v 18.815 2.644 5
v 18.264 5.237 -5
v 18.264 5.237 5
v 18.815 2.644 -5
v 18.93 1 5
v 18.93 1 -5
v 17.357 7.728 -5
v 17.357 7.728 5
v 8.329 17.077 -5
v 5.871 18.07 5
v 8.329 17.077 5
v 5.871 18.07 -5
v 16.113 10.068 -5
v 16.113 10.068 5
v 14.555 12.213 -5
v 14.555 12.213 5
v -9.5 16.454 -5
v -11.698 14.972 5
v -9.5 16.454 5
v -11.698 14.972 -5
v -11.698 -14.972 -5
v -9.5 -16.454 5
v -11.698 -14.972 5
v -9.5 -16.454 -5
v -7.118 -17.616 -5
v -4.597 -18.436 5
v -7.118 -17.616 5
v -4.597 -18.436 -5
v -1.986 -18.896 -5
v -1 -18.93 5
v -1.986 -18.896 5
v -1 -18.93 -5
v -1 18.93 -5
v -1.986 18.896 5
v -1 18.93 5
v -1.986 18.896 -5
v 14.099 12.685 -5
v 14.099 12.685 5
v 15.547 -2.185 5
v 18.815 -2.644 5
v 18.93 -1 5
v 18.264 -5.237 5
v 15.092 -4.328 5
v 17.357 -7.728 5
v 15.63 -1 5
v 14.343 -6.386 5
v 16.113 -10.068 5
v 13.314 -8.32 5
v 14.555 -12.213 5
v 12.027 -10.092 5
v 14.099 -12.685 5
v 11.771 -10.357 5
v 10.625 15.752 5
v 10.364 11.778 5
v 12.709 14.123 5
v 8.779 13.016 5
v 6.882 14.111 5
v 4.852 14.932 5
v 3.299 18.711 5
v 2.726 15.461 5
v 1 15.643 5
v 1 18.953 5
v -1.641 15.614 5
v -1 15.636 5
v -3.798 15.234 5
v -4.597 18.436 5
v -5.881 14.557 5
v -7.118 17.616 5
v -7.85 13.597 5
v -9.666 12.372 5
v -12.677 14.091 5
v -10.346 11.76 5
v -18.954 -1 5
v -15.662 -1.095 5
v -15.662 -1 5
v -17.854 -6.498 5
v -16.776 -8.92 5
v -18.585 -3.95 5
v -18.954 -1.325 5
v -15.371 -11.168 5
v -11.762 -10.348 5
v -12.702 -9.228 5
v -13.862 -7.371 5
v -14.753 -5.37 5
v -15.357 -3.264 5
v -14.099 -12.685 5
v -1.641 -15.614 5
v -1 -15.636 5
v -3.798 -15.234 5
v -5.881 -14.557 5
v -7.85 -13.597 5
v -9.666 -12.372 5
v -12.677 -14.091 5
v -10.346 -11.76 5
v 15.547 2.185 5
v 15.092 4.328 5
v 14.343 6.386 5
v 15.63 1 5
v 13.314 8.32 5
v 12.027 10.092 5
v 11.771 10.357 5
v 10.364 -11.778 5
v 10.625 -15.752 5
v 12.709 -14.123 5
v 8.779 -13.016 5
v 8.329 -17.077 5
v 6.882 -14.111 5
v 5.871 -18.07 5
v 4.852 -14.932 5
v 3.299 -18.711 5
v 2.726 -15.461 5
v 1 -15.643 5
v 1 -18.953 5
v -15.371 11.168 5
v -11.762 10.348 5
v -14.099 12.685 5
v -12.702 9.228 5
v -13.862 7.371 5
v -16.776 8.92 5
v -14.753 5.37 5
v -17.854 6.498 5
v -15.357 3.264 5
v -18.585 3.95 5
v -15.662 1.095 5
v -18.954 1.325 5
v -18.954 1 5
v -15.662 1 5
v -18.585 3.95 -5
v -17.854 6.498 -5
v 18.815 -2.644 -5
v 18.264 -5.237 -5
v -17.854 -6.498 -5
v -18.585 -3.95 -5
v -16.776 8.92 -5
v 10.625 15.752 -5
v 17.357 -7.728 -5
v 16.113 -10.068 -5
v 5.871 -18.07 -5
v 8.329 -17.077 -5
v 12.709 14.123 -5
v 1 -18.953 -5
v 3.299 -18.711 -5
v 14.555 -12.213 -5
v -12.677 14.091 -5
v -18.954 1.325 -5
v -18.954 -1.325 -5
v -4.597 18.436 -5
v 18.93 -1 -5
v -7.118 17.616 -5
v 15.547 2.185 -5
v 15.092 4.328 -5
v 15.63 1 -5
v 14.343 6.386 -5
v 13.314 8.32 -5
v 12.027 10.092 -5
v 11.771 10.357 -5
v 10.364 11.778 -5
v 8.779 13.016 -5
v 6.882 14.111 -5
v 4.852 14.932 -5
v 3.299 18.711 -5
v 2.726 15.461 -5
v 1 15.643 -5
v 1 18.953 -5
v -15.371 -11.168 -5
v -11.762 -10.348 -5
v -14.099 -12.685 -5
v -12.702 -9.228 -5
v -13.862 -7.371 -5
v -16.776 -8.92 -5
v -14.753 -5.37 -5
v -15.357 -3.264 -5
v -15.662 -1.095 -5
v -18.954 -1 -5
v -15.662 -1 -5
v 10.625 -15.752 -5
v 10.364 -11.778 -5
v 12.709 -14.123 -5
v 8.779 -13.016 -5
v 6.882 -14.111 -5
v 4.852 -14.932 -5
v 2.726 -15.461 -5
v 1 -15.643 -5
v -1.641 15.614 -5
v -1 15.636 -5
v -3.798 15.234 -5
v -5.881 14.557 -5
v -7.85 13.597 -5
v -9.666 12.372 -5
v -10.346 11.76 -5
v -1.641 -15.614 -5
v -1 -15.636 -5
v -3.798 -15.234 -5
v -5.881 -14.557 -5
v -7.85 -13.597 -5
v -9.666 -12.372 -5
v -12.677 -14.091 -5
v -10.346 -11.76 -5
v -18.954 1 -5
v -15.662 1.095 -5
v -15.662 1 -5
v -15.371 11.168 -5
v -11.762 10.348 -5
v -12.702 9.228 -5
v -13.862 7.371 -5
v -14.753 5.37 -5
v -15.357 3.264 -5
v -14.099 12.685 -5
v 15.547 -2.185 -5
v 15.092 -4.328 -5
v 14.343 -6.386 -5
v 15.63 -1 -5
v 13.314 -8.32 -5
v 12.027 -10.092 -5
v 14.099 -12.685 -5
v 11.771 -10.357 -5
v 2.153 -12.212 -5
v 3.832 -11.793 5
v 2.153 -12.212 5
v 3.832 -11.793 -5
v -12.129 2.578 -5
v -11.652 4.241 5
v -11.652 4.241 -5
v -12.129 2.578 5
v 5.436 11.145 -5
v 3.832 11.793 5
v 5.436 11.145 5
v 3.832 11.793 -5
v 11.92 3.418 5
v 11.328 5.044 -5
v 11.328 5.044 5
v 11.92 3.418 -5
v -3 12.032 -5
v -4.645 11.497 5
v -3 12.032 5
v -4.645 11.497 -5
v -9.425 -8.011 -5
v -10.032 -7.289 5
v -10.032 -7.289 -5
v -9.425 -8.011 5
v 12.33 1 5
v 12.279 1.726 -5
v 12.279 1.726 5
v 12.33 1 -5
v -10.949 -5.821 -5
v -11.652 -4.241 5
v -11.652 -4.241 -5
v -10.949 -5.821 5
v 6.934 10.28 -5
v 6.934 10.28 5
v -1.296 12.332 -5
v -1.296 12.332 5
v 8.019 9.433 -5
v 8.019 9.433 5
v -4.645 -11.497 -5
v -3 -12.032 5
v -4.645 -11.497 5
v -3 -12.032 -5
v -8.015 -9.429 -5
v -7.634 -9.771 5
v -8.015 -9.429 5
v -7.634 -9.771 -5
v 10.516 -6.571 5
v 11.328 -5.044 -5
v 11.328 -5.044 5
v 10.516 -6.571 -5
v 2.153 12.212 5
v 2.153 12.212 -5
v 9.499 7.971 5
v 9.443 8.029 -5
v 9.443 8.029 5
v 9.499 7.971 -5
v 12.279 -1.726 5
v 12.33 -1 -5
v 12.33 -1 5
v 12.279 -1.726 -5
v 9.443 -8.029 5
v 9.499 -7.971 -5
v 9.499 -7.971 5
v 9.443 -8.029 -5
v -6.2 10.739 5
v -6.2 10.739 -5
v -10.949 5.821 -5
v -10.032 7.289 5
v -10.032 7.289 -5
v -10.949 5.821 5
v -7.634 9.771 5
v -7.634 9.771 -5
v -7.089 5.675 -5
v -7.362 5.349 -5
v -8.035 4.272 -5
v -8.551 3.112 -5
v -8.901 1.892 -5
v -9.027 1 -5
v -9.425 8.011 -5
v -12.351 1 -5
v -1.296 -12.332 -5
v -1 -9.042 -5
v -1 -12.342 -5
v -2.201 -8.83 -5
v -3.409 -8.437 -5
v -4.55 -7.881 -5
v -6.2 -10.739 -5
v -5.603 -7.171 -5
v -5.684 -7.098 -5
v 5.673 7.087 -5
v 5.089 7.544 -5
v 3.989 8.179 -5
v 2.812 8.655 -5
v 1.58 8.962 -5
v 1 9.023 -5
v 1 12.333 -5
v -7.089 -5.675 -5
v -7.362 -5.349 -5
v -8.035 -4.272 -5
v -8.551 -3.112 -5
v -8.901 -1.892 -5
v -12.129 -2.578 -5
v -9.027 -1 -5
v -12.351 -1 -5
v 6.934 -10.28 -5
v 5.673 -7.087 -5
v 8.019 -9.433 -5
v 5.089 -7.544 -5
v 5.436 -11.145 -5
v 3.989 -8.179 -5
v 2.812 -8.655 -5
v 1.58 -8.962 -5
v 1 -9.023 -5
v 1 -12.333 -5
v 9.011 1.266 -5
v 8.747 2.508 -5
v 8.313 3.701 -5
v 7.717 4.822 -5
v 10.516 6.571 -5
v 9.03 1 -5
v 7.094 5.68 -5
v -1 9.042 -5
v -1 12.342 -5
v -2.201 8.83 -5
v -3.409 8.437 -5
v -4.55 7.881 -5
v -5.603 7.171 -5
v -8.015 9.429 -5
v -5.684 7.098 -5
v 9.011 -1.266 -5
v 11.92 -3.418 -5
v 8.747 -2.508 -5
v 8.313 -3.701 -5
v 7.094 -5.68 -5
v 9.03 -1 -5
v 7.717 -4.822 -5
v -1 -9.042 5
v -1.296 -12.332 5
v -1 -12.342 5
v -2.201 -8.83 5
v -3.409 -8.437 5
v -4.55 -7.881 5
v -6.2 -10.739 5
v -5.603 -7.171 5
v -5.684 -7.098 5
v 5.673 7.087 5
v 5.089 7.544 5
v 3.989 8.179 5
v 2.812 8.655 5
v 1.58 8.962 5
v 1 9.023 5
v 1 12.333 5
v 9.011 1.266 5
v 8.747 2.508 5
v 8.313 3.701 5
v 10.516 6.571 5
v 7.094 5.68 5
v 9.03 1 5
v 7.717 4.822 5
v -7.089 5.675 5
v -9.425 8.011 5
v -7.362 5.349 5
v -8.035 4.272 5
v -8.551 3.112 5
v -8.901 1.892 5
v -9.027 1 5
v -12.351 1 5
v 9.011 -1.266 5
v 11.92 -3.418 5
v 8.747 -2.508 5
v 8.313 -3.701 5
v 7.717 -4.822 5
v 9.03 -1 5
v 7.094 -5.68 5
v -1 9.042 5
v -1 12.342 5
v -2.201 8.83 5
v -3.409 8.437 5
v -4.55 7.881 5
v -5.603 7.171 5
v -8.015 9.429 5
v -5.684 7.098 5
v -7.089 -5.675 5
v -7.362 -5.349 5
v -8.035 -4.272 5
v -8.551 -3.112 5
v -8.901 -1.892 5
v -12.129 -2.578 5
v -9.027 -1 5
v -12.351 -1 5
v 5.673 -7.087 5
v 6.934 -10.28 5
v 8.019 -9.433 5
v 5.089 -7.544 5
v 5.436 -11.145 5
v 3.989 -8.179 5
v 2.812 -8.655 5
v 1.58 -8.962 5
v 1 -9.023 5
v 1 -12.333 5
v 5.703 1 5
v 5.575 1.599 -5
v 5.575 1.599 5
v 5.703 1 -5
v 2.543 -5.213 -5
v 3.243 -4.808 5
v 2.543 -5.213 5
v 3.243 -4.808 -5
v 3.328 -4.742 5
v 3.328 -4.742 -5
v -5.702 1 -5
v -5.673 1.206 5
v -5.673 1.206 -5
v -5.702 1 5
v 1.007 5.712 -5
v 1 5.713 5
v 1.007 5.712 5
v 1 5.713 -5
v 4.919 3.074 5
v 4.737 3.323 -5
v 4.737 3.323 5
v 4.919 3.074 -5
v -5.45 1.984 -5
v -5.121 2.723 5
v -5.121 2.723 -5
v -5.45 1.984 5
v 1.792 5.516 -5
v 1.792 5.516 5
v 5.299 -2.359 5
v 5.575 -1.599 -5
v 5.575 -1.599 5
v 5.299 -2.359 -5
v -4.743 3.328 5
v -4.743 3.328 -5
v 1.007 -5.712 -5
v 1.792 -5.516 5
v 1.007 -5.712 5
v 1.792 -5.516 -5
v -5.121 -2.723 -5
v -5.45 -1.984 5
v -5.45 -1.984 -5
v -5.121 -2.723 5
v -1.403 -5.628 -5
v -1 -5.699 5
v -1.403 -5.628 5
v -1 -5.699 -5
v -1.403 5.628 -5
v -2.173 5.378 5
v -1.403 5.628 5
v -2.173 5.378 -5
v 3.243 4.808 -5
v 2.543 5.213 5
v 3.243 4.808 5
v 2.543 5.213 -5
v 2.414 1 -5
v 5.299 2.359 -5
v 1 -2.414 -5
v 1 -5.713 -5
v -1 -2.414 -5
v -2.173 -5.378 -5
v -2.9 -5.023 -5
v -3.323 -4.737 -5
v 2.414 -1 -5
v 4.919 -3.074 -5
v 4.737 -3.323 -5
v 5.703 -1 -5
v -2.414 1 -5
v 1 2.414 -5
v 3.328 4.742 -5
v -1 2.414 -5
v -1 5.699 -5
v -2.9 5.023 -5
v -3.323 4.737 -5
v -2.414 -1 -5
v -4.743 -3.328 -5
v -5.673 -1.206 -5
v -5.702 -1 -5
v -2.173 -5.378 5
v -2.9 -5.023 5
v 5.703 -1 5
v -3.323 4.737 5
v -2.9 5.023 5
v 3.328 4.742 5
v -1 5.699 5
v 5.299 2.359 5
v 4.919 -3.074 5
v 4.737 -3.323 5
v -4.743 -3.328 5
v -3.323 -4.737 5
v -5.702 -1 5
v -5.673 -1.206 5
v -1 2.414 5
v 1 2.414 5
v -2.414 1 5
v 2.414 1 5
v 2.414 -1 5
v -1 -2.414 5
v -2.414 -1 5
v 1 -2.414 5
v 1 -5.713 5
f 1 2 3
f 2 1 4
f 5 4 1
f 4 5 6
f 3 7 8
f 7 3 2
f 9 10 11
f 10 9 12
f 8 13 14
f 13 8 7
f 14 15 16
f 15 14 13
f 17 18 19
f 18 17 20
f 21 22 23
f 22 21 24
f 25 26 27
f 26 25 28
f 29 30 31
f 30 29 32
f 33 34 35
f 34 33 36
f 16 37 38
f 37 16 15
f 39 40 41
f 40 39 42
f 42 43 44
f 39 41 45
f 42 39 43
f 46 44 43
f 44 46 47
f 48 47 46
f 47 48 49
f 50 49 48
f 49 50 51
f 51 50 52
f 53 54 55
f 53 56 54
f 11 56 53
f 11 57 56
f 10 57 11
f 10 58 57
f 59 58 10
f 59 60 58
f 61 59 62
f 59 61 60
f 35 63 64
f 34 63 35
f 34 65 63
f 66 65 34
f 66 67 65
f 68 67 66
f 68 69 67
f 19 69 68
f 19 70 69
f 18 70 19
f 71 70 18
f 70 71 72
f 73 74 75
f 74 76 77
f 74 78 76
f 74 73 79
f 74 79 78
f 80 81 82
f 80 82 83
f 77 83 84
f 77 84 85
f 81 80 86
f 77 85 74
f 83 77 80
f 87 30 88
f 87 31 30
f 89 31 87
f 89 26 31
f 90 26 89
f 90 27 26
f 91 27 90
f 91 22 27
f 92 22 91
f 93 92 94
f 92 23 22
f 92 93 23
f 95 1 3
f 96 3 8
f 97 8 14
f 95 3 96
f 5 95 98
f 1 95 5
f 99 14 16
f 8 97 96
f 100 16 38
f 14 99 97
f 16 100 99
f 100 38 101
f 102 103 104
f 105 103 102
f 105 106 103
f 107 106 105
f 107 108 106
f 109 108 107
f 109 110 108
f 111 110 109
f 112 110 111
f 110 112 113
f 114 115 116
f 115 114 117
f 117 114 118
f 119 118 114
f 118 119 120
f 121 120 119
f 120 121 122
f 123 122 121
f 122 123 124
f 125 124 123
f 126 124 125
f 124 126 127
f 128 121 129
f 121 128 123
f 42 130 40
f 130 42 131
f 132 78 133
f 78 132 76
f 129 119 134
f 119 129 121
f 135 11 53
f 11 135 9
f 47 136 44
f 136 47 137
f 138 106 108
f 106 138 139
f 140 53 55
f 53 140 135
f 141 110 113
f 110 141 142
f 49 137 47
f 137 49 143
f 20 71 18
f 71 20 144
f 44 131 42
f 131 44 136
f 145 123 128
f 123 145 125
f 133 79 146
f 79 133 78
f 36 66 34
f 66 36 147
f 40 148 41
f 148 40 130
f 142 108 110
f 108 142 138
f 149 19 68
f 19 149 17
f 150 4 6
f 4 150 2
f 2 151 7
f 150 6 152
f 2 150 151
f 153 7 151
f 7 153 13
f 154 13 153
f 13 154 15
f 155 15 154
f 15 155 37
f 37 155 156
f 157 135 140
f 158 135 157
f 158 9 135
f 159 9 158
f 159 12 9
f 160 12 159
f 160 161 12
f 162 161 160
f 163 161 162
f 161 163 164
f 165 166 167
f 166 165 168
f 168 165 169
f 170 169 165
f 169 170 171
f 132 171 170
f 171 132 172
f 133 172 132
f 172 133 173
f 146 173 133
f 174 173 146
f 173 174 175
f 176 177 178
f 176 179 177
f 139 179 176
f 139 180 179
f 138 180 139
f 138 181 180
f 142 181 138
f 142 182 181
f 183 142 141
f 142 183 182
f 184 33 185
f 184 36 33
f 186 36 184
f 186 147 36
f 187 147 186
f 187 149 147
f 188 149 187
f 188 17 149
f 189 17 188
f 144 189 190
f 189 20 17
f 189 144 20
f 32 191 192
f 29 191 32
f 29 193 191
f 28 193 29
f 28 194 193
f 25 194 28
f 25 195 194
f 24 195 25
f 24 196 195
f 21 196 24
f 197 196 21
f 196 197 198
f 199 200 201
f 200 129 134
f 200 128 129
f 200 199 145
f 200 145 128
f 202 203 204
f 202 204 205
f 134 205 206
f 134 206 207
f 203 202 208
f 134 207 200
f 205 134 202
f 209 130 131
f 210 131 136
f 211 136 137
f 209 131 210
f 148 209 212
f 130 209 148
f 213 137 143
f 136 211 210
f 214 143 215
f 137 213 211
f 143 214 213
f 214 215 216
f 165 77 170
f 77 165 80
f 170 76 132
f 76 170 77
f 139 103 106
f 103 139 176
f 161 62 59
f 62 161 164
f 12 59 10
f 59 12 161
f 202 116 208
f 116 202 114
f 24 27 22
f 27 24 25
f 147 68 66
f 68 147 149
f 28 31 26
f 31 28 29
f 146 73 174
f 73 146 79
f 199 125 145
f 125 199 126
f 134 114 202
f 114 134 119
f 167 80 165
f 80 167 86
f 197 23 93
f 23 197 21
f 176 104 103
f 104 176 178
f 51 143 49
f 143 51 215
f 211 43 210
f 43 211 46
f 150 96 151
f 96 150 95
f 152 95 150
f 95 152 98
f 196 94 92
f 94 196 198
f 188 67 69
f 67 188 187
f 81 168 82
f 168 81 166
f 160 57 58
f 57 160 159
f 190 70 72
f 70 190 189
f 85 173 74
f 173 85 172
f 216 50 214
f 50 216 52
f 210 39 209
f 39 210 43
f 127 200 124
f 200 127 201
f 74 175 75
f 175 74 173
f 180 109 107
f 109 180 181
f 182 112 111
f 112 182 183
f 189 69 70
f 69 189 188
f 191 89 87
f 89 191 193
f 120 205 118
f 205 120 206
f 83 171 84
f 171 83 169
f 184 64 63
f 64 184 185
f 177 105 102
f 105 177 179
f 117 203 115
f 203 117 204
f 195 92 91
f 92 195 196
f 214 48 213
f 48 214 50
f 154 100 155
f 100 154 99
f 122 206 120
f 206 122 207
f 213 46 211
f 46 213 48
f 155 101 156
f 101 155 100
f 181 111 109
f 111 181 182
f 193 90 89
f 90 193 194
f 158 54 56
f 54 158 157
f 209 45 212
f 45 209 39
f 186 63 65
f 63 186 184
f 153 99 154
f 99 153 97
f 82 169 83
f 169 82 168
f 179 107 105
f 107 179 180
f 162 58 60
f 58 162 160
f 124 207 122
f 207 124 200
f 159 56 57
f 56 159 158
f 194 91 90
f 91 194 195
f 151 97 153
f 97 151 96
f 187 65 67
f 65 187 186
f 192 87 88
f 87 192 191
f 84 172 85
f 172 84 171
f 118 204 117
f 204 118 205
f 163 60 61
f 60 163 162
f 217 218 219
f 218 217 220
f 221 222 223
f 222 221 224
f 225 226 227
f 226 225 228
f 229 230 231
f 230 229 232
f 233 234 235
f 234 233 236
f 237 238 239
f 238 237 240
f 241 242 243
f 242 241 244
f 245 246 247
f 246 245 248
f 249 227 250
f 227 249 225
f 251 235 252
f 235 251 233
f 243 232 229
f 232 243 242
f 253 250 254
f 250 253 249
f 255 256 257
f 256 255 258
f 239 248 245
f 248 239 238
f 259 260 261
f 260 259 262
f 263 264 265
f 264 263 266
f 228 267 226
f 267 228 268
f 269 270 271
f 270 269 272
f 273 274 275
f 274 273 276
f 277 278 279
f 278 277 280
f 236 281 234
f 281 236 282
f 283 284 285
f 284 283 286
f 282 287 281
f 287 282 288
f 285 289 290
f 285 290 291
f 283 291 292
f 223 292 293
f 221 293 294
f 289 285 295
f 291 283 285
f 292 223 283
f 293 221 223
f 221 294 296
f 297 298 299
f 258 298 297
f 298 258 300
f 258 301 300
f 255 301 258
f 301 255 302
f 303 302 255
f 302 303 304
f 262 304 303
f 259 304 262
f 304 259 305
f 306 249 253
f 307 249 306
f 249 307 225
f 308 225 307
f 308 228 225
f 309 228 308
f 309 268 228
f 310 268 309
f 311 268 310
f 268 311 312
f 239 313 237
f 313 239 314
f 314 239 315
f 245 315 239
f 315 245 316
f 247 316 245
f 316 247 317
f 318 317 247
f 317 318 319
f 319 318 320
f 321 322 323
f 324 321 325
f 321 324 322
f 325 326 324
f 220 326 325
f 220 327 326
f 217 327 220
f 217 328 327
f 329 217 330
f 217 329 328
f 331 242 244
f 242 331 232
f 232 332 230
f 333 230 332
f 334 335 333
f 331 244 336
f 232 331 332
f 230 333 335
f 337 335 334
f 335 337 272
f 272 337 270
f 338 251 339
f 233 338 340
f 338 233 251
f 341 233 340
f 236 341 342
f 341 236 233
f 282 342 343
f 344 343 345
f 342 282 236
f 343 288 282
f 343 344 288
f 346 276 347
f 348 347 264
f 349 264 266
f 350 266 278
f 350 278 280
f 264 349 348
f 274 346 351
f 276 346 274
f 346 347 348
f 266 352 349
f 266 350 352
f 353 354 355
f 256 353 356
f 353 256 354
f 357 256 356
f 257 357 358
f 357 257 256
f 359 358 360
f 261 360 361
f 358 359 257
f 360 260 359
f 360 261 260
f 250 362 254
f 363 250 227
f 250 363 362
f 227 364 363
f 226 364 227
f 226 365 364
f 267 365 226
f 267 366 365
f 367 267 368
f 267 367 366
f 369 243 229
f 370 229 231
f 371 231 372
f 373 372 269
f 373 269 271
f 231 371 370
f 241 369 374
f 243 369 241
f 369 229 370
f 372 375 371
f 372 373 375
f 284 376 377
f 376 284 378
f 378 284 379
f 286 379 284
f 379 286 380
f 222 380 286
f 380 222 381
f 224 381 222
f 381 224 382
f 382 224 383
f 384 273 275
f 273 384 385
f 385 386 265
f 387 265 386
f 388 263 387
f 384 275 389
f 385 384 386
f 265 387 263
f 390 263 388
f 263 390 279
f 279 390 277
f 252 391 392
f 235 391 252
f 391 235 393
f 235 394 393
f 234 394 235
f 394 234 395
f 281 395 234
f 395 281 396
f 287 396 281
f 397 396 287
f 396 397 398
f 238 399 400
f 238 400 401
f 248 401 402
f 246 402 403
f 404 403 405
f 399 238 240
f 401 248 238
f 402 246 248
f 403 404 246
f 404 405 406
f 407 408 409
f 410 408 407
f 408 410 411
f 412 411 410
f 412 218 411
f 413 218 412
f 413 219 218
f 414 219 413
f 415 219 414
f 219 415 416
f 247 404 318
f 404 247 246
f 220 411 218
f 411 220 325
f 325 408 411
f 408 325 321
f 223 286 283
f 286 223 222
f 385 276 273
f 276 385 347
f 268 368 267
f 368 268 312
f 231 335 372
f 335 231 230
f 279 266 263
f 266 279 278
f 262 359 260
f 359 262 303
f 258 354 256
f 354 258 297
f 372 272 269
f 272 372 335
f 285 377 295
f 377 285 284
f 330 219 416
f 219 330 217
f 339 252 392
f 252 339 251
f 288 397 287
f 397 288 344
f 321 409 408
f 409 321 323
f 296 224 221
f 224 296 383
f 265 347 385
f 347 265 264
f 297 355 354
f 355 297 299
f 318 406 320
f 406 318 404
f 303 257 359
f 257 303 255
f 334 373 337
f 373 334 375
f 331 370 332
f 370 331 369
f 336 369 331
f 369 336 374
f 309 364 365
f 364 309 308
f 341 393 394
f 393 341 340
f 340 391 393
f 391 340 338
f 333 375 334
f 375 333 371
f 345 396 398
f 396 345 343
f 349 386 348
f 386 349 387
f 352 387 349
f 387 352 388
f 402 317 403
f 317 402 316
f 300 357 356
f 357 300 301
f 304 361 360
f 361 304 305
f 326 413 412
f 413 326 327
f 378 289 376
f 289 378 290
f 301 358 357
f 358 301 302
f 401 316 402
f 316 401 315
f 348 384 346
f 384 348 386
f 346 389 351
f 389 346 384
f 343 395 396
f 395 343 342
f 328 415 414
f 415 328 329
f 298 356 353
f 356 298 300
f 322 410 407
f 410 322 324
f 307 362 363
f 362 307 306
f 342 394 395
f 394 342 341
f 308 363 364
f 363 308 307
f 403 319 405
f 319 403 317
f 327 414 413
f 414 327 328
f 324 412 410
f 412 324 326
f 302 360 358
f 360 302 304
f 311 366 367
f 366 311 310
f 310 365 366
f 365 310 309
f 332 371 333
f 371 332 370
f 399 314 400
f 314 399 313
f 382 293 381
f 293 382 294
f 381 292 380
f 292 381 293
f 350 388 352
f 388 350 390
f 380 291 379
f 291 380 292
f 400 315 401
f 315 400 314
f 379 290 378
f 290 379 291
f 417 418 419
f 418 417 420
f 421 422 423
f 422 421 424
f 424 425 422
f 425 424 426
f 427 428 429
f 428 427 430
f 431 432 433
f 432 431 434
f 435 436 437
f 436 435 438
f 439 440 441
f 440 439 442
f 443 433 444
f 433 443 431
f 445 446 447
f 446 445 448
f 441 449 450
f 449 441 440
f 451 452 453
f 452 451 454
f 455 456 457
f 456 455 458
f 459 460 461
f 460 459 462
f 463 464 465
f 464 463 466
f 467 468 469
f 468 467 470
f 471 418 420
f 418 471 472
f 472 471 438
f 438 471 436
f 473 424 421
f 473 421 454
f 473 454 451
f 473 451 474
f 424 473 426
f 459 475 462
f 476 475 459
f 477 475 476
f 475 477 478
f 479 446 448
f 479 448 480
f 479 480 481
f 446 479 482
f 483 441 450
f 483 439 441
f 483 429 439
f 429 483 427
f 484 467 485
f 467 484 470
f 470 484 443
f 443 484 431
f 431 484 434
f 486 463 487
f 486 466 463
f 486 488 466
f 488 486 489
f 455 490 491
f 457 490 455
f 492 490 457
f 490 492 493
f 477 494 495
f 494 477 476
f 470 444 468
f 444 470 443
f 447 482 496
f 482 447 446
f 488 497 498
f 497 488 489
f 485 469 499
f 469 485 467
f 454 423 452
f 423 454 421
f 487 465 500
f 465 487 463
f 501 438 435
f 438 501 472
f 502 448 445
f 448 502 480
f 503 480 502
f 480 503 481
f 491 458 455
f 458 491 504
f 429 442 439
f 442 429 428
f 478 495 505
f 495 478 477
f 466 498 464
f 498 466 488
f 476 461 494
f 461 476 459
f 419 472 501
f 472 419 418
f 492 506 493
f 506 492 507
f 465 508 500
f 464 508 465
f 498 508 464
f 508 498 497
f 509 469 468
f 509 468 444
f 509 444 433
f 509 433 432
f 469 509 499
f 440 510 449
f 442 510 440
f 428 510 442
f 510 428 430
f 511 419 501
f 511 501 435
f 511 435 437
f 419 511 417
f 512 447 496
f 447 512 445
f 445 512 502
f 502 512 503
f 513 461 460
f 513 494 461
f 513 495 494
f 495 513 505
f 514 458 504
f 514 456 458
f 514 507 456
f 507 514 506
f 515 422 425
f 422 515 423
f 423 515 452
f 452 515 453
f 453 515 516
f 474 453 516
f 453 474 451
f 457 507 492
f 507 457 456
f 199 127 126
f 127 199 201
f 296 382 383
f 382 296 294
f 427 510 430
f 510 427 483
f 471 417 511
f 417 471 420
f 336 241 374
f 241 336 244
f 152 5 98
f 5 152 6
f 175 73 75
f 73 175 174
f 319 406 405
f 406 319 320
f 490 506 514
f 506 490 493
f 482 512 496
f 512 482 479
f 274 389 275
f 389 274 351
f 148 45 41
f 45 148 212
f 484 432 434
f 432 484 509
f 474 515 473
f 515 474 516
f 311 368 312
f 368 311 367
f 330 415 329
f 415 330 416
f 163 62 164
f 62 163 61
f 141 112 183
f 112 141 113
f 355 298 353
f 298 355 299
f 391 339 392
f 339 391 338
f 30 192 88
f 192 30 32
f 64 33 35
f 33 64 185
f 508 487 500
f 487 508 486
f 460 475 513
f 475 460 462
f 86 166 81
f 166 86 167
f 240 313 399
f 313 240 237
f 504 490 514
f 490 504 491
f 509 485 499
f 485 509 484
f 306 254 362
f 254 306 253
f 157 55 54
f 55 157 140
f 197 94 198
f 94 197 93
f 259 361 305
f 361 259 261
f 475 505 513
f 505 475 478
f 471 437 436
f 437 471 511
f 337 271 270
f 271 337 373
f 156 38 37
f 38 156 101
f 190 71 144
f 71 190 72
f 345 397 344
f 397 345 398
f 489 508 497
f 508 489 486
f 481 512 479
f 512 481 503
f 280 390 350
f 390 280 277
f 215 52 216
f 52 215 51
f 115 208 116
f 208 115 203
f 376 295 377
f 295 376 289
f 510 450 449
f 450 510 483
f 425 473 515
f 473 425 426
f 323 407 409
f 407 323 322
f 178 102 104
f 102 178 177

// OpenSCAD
/* [FAN FEATURES] */

// How large is the fan rotor ? (mm)
OuterDiameter=38; 
// How large is the inner part of the fan rotator ? (mm)
InnerDiameter=5; 

/* [RINGS] */

// How many concentric rings should be generated ?
NumberOfRings = 3; // [1:20]
// The height of the extruded rings (mm)
Height = 10; 
// The number of faces on each ring perimeter
Resoultion=45; // [3:100]


/* [CONNECTORS] */

// With of the solid connectors that keeps the rings attached to the surface (mm)
ConnectorsWidth=2;  
// Generate a pair of solid orthogonal connectors ?
AddOrtogonalConnectors="YES"; // [YES,NO]
// Generate a pair of solid diagonal connectors ?
AddDiagonalConnectors="YES"; // [YES,NO]


// VARIABLES INITIALIZATION
echo("OuterDiameter=",OuterDiameter);
echo("InnerDiameter=",InnerDiameter);
echo("NumberOfRings=",NumberOfRings);
echo("Height=",Height);
echo("Resoultion=",Resoultion);

OuterRadius = OuterDiameter/2;
echo("OuterRadius=",OuterRadius);
InnerRadius = InnerDiameter/2;
echo("InnerRadius=",InnerRadius);

DeltaRadius = OuterRadius-InnerRadius;
echo("DeltaRadius=",DeltaRadius);
RingRadiusStep =DeltaRadius/(NumberOfRings*2-1);
echo("RingRadiusStep=",RingRadiusStep);


 
difference()
{
for (i=[0:2:(NumberOfRings*2-1)]){
echo(i," - Outer radius=",OuterRadius-(RingRadiusStep*(i)));
echo(i," - Inner radius=",OuterRadius-(RingRadiusStep*(i+1)));
 difference()
 {  
  cylinder(h=Height,r=OuterRadius-(RingRadiusStep*(i)), center = true, $fn=Resoultion);
  cylinder(h=Height*2,r=OuterRadius-(RingRadiusStep*(i+1)), center = true, $fn=Resoultion);
 } 
}


if(AddOrtogonalConnectors=="YES")
{
cube(size = [OuterDiameter*1.1,ConnectorsWidth,Height*2], center = true);
cube(size = [ConnectorsWidth,OuterDiameter*1.1,Height*2], center = true);
}

if(AddDiagonalConnectors=="YES")
{
rotate([0,0,45])
{
cube(size = [OuterDiameter*1.1,ConnectorsWidth,Height*2], center = true);
cube(size = [ConnectorsWidth,OuterDiameter*1.1,Height*2], center = true);
}
}

}
